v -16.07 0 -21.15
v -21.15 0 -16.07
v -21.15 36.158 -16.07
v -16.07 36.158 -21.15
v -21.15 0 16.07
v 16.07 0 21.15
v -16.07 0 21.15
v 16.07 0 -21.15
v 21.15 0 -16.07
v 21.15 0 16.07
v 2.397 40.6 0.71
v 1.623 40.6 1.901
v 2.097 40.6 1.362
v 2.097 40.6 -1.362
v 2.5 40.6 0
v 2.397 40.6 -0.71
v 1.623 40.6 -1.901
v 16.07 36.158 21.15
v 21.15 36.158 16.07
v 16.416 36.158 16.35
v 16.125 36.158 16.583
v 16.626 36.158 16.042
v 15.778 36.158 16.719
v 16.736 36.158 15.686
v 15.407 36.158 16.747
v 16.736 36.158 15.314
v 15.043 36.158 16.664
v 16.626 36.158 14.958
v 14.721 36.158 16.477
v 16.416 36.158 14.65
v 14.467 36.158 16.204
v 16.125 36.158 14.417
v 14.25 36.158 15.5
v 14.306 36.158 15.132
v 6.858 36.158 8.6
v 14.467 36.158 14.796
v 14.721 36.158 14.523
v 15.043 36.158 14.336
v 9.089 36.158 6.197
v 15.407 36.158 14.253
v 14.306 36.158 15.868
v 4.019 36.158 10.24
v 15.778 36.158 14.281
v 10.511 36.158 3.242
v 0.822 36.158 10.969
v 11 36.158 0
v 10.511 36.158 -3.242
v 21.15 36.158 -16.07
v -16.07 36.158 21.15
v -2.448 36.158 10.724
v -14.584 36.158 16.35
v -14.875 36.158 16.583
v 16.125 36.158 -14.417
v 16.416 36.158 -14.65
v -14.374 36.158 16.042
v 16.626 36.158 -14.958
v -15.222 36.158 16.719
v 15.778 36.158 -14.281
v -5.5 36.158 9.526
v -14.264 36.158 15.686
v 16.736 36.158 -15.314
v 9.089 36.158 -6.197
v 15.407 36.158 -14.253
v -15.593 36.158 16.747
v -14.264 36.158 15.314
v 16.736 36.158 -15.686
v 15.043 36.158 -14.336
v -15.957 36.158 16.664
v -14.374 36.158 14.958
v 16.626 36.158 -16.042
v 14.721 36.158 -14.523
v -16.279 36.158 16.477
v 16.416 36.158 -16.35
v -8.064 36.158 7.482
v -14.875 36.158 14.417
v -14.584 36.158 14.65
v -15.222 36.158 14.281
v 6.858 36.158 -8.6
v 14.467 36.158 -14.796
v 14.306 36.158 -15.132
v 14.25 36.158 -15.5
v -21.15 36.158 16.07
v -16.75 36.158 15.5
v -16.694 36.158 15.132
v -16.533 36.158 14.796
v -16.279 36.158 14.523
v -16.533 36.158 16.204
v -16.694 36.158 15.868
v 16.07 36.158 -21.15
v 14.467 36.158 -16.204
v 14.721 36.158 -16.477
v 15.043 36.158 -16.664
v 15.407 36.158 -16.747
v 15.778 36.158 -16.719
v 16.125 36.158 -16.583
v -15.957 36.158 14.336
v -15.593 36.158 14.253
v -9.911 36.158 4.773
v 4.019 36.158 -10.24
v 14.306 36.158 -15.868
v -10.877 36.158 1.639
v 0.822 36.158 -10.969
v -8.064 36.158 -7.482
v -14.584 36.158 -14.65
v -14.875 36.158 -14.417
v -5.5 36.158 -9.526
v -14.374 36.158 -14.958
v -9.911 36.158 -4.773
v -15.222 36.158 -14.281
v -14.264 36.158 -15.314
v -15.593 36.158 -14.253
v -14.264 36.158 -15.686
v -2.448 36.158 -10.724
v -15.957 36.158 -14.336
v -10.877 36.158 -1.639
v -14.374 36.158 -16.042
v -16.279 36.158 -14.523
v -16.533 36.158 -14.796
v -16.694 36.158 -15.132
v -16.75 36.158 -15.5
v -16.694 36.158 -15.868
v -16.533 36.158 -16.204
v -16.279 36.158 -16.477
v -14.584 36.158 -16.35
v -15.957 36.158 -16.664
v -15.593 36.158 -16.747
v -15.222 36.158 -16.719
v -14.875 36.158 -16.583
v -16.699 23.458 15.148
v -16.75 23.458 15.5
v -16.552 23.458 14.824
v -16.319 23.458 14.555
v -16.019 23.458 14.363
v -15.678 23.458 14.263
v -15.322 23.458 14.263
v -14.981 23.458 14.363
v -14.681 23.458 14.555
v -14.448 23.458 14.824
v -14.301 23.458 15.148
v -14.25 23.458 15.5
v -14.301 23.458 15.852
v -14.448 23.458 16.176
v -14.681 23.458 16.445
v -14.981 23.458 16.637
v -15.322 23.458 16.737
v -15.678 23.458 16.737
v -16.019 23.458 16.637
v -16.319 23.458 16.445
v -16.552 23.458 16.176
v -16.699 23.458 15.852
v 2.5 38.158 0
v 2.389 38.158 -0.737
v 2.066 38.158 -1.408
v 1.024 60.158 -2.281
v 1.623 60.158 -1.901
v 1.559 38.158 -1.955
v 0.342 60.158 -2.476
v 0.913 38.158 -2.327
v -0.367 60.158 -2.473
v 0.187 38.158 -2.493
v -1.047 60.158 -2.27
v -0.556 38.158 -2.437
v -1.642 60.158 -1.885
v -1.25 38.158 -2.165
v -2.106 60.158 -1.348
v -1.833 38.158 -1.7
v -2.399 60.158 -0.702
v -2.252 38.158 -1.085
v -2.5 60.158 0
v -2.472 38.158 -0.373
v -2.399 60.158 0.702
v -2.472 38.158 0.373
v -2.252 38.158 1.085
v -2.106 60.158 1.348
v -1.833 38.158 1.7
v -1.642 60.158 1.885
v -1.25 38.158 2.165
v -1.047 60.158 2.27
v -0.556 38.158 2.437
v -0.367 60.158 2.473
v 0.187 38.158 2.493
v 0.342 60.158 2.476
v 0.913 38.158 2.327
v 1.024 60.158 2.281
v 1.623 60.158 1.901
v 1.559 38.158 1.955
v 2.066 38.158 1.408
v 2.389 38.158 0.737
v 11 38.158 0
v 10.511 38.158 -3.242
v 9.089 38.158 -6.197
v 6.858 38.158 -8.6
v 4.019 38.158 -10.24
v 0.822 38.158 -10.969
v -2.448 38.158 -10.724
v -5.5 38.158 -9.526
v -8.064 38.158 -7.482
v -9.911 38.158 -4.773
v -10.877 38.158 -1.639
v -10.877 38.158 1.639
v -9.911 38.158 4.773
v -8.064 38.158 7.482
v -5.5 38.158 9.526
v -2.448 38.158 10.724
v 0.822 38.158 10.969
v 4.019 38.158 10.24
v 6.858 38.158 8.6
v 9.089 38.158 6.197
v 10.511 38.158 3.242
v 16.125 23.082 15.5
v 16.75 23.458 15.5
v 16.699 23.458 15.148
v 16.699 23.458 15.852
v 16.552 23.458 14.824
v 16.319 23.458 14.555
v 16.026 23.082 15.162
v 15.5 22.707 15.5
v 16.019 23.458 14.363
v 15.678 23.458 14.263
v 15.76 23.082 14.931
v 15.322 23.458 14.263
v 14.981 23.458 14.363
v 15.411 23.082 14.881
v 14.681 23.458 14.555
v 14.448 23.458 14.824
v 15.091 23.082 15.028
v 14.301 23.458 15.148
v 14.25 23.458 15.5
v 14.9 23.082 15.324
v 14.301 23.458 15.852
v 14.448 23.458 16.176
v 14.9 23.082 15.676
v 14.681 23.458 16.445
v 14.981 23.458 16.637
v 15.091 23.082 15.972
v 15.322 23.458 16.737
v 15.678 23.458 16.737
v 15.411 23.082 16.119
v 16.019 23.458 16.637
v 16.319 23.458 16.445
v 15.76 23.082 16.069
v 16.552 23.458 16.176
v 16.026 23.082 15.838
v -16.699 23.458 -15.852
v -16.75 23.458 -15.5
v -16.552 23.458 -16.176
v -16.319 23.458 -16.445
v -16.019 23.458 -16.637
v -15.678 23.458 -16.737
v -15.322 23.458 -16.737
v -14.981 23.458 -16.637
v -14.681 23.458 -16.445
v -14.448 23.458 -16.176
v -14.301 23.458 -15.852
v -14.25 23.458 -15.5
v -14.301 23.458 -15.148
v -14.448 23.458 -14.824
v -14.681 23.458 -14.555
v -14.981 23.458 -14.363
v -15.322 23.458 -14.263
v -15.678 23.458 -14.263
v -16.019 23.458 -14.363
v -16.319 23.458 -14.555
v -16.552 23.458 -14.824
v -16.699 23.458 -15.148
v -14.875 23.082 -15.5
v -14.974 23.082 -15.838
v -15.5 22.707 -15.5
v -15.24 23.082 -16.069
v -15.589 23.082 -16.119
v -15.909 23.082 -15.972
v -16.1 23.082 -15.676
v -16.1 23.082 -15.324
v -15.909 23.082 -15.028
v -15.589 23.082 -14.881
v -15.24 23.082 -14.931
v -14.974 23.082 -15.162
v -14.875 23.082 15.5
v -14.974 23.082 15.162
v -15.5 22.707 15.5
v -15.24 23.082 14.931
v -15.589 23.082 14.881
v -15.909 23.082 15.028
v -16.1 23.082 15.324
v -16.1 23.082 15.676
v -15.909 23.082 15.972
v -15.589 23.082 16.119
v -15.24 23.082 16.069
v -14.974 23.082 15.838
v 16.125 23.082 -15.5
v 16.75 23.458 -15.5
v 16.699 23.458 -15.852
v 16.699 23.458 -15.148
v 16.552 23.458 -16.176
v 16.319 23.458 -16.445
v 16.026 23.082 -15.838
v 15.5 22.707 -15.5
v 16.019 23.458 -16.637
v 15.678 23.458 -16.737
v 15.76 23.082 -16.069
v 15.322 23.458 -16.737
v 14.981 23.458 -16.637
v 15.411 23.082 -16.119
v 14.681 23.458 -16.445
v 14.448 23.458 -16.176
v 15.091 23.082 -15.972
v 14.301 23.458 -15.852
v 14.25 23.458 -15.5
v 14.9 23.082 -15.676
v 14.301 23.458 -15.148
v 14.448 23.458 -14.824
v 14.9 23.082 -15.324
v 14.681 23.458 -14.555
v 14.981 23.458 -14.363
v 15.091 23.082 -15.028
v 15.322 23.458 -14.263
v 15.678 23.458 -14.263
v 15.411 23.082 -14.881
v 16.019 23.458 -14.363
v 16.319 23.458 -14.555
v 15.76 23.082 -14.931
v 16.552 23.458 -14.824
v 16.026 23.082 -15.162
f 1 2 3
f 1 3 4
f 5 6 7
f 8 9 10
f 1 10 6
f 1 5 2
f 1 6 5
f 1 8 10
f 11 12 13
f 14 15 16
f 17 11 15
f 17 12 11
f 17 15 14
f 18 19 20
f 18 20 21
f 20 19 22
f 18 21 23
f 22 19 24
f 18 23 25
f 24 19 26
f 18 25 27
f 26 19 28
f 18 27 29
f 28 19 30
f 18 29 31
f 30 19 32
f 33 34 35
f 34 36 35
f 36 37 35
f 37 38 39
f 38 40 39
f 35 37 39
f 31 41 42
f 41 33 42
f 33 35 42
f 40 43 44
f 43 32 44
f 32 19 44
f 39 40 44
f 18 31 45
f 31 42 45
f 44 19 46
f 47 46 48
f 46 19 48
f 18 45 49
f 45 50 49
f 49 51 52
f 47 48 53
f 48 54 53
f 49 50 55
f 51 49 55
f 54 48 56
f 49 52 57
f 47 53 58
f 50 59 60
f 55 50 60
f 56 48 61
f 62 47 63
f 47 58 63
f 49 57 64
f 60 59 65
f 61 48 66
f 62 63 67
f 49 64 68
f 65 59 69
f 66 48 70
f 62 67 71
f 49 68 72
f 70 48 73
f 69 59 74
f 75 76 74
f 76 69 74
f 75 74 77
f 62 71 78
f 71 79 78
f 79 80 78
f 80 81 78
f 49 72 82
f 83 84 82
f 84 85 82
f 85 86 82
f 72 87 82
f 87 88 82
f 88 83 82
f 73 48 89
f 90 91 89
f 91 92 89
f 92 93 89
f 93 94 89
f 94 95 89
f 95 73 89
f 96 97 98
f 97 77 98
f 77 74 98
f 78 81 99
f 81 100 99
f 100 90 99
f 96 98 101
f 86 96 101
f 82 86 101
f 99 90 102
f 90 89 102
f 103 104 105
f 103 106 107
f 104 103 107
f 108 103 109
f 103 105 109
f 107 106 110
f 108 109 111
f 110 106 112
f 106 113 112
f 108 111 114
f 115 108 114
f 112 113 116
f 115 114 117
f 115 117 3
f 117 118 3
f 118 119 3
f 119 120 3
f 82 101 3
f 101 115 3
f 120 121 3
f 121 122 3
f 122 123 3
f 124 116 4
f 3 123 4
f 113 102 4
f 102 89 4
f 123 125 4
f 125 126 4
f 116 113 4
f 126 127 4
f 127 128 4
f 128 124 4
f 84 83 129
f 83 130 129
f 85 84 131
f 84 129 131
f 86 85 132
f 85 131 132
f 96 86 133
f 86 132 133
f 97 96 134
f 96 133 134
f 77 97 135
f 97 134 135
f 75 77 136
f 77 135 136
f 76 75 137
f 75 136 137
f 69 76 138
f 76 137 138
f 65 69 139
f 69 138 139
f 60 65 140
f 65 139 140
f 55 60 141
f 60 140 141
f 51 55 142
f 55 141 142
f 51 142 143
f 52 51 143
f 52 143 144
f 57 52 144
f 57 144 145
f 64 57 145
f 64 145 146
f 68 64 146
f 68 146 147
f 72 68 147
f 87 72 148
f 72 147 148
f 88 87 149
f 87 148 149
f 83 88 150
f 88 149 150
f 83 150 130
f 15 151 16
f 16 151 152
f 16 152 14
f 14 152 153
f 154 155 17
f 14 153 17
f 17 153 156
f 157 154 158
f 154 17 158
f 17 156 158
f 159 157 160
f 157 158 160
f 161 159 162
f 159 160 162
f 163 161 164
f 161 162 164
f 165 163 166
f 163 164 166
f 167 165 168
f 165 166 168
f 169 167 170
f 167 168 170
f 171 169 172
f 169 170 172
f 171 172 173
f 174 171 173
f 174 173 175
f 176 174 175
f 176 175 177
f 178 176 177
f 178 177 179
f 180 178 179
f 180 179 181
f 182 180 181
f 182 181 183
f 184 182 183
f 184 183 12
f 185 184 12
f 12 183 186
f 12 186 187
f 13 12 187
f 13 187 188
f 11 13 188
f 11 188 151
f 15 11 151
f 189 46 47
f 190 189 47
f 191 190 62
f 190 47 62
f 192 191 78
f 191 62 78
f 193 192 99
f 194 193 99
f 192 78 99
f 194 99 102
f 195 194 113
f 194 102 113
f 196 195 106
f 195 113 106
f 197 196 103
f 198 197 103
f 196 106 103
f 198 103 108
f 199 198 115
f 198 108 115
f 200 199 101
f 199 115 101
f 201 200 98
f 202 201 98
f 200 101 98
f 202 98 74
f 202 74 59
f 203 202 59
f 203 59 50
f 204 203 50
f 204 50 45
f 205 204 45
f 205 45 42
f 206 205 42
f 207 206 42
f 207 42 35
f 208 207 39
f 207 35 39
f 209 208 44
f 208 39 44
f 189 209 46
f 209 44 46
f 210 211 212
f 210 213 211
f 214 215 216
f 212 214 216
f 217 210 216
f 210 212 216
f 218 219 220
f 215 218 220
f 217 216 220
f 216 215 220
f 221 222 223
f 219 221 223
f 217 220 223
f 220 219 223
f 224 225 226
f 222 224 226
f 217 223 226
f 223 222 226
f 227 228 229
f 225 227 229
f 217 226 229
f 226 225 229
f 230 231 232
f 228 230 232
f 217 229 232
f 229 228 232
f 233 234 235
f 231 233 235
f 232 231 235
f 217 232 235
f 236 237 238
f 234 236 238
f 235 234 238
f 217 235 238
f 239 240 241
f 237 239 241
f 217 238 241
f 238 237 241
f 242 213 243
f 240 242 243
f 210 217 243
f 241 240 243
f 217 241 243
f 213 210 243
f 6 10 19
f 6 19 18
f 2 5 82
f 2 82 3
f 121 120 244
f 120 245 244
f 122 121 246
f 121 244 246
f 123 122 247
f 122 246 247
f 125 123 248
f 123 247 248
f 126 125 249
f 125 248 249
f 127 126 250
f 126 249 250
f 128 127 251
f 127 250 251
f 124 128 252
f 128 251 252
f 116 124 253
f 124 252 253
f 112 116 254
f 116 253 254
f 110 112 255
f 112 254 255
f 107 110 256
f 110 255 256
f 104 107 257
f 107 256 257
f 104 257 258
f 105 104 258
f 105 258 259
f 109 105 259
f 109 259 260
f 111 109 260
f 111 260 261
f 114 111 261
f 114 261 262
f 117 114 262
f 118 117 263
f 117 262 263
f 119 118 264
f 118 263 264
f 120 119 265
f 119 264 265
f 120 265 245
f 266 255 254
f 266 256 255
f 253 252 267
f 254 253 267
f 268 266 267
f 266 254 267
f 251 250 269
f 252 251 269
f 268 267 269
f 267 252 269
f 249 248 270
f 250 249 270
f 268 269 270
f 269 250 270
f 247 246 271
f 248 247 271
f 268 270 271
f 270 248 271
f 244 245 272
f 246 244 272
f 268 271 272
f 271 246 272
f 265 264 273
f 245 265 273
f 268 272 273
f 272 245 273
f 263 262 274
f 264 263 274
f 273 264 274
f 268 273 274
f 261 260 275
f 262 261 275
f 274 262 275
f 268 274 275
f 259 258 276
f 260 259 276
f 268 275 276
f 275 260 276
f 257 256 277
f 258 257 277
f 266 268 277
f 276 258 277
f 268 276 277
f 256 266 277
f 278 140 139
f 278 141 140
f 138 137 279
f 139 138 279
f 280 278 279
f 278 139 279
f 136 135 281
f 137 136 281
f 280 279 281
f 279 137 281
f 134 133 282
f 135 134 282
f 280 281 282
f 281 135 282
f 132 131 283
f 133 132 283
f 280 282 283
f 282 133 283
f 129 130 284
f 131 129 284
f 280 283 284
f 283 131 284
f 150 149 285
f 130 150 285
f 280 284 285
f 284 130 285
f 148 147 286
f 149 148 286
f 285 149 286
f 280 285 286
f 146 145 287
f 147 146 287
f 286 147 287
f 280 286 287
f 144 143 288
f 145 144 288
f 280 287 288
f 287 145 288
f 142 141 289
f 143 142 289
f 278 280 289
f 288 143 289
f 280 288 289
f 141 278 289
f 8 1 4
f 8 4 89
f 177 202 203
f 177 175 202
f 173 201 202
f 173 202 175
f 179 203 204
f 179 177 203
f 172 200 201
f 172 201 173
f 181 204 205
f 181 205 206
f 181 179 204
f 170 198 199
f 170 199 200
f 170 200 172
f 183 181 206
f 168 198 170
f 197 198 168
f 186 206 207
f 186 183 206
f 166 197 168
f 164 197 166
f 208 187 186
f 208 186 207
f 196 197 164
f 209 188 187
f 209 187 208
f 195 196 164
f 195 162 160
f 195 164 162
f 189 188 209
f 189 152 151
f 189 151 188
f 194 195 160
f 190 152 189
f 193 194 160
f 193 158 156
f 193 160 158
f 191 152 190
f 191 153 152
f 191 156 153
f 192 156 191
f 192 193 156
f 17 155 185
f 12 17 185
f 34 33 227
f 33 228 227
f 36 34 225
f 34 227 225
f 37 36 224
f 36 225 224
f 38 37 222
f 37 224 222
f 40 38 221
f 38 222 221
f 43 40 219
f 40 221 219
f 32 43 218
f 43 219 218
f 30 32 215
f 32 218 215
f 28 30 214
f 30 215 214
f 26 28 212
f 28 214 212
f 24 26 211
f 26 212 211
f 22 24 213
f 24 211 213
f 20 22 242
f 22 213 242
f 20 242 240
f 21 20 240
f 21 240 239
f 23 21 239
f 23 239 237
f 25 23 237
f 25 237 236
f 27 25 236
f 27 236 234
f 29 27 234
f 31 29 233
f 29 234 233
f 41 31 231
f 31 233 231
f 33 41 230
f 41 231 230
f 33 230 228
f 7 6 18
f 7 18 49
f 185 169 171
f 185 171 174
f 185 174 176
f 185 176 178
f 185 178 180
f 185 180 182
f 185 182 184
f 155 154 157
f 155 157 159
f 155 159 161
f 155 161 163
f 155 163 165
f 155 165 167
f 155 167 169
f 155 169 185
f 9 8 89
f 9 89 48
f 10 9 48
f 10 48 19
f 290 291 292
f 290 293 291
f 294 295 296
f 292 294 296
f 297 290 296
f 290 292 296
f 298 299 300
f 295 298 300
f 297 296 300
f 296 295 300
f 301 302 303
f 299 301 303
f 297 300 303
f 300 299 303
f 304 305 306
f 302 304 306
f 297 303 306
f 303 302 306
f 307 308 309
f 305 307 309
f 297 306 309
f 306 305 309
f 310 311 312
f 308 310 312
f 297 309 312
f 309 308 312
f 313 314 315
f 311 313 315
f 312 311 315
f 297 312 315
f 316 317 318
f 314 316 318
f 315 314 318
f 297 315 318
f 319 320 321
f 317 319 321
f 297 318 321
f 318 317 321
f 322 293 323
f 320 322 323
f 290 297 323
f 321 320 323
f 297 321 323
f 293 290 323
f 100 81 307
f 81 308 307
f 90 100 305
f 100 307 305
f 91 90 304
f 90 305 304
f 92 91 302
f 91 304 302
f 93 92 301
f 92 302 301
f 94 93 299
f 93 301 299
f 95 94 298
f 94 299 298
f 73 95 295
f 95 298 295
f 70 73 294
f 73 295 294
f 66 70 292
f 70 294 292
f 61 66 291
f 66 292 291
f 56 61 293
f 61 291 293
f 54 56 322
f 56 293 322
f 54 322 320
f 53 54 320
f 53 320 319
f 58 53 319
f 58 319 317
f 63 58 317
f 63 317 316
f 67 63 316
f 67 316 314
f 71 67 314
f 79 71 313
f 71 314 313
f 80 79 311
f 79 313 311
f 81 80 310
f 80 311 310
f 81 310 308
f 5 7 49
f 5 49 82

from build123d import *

# Parameters (mm, degrees)
BOSS_EXTRUDE1_DEPTH             = 36.158
TAP_DRILL_FOR_M3X0_5_TAP1_D     = 2.5
TAP_DRILL_FOR_M3X0_5_TAP1_DEPTH = 12.7
TAP_DRILL_FOR_M3X0_5_TAP1_TIP   = 0.751075774
SKETCH4_R                       = 11
BOSS_EXTRUDE2_DEPTH             = 2
SKETCH5_R                       = 2.5
BOSS_EXTRUDE3_DEPTH             = 22
CUT_EXTRUDE1_DEPTH              = 19.558


with BuildPart() as part:
    # Sketch1 → Boss-Extrude1 (new body)
    with BuildSketch(Plane(origin=(0, 0, 0), x_dir=(1, 0, 0), z_dir=(0, 1, 0))):
        Polygon((-21.15, 16.07), (-16.07, 21.15), (16.07, 21.15), (21.15, 16.07), (21.15, -16.07), (16.07, -21.15), (-16.07, -21.15), (-21.15, -16.07), align=None)
    extrude(amount=BOSS_EXTRUDE1_DEPTH)

    # Tap Drill for M3x0.5 Tap1
    with Locations(Plane(origin=(0, 36.158, 0), x_dir=(1, 0, 0), z_dir=(0, 1, 0))):
        with Locations((-15.5, 15.5), (15.5, 15.5), (15.5, -15.5), (-15.5, -15.5)):
            Hole(TAP_DRILL_FOR_M3X0_5_TAP1_D / 2, depth=TAP_DRILL_FOR_M3X0_5_TAP1_DEPTH)
            with Locations((0, 0, -(TAP_DRILL_FOR_M3X0_5_TAP1_DEPTH + TAP_DRILL_FOR_M3X0_5_TAP1_TIP / 2))):  # 118° drill point
                Cone(0, TAP_DRILL_FOR_M3X0_5_TAP1_D / 2, TAP_DRILL_FOR_M3X0_5_TAP1_TIP, mode=Mode.SUBTRACT)

    # Sketch4 → Boss-Extrude2 (add)
    with BuildSketch(Plane(origin=(0, 36.158, 0), x_dir=(1, 0, 0), z_dir=(0, 1, 0))):
        Circle(SKETCH4_R)
    extrude(amount=BOSS_EXTRUDE2_DEPTH)

    # Sketch5 → Boss-Extrude3 (add)
    with BuildSketch(Plane(origin=(0, 38.158, 0), x_dir=(1, 0, 0), z_dir=(0, 1, 0))):
        Circle(SKETCH5_R)
    extrude(amount=BOSS_EXTRUDE3_DEPTH)

    # Sketch6 → Cut-Extrude1 (cut)
    with BuildSketch(Plane(origin=(0, 60.158, 0), x_dir=(1, 0, 0), z_dir=(0, 1, 0))):
        with BuildLine():
            Line((1.623373896, 1.901225182), (1.623373896, -1.901225182))
            ThreePointArc((1.623373896, -1.901225182), (2.5, 0), (1.623373896, 1.901225182))
        make_face()
    extrude(amount=-CUT_EXTRUDE1_DEPTH, mode=Mode.SUBTRACT)


solid = part.part
